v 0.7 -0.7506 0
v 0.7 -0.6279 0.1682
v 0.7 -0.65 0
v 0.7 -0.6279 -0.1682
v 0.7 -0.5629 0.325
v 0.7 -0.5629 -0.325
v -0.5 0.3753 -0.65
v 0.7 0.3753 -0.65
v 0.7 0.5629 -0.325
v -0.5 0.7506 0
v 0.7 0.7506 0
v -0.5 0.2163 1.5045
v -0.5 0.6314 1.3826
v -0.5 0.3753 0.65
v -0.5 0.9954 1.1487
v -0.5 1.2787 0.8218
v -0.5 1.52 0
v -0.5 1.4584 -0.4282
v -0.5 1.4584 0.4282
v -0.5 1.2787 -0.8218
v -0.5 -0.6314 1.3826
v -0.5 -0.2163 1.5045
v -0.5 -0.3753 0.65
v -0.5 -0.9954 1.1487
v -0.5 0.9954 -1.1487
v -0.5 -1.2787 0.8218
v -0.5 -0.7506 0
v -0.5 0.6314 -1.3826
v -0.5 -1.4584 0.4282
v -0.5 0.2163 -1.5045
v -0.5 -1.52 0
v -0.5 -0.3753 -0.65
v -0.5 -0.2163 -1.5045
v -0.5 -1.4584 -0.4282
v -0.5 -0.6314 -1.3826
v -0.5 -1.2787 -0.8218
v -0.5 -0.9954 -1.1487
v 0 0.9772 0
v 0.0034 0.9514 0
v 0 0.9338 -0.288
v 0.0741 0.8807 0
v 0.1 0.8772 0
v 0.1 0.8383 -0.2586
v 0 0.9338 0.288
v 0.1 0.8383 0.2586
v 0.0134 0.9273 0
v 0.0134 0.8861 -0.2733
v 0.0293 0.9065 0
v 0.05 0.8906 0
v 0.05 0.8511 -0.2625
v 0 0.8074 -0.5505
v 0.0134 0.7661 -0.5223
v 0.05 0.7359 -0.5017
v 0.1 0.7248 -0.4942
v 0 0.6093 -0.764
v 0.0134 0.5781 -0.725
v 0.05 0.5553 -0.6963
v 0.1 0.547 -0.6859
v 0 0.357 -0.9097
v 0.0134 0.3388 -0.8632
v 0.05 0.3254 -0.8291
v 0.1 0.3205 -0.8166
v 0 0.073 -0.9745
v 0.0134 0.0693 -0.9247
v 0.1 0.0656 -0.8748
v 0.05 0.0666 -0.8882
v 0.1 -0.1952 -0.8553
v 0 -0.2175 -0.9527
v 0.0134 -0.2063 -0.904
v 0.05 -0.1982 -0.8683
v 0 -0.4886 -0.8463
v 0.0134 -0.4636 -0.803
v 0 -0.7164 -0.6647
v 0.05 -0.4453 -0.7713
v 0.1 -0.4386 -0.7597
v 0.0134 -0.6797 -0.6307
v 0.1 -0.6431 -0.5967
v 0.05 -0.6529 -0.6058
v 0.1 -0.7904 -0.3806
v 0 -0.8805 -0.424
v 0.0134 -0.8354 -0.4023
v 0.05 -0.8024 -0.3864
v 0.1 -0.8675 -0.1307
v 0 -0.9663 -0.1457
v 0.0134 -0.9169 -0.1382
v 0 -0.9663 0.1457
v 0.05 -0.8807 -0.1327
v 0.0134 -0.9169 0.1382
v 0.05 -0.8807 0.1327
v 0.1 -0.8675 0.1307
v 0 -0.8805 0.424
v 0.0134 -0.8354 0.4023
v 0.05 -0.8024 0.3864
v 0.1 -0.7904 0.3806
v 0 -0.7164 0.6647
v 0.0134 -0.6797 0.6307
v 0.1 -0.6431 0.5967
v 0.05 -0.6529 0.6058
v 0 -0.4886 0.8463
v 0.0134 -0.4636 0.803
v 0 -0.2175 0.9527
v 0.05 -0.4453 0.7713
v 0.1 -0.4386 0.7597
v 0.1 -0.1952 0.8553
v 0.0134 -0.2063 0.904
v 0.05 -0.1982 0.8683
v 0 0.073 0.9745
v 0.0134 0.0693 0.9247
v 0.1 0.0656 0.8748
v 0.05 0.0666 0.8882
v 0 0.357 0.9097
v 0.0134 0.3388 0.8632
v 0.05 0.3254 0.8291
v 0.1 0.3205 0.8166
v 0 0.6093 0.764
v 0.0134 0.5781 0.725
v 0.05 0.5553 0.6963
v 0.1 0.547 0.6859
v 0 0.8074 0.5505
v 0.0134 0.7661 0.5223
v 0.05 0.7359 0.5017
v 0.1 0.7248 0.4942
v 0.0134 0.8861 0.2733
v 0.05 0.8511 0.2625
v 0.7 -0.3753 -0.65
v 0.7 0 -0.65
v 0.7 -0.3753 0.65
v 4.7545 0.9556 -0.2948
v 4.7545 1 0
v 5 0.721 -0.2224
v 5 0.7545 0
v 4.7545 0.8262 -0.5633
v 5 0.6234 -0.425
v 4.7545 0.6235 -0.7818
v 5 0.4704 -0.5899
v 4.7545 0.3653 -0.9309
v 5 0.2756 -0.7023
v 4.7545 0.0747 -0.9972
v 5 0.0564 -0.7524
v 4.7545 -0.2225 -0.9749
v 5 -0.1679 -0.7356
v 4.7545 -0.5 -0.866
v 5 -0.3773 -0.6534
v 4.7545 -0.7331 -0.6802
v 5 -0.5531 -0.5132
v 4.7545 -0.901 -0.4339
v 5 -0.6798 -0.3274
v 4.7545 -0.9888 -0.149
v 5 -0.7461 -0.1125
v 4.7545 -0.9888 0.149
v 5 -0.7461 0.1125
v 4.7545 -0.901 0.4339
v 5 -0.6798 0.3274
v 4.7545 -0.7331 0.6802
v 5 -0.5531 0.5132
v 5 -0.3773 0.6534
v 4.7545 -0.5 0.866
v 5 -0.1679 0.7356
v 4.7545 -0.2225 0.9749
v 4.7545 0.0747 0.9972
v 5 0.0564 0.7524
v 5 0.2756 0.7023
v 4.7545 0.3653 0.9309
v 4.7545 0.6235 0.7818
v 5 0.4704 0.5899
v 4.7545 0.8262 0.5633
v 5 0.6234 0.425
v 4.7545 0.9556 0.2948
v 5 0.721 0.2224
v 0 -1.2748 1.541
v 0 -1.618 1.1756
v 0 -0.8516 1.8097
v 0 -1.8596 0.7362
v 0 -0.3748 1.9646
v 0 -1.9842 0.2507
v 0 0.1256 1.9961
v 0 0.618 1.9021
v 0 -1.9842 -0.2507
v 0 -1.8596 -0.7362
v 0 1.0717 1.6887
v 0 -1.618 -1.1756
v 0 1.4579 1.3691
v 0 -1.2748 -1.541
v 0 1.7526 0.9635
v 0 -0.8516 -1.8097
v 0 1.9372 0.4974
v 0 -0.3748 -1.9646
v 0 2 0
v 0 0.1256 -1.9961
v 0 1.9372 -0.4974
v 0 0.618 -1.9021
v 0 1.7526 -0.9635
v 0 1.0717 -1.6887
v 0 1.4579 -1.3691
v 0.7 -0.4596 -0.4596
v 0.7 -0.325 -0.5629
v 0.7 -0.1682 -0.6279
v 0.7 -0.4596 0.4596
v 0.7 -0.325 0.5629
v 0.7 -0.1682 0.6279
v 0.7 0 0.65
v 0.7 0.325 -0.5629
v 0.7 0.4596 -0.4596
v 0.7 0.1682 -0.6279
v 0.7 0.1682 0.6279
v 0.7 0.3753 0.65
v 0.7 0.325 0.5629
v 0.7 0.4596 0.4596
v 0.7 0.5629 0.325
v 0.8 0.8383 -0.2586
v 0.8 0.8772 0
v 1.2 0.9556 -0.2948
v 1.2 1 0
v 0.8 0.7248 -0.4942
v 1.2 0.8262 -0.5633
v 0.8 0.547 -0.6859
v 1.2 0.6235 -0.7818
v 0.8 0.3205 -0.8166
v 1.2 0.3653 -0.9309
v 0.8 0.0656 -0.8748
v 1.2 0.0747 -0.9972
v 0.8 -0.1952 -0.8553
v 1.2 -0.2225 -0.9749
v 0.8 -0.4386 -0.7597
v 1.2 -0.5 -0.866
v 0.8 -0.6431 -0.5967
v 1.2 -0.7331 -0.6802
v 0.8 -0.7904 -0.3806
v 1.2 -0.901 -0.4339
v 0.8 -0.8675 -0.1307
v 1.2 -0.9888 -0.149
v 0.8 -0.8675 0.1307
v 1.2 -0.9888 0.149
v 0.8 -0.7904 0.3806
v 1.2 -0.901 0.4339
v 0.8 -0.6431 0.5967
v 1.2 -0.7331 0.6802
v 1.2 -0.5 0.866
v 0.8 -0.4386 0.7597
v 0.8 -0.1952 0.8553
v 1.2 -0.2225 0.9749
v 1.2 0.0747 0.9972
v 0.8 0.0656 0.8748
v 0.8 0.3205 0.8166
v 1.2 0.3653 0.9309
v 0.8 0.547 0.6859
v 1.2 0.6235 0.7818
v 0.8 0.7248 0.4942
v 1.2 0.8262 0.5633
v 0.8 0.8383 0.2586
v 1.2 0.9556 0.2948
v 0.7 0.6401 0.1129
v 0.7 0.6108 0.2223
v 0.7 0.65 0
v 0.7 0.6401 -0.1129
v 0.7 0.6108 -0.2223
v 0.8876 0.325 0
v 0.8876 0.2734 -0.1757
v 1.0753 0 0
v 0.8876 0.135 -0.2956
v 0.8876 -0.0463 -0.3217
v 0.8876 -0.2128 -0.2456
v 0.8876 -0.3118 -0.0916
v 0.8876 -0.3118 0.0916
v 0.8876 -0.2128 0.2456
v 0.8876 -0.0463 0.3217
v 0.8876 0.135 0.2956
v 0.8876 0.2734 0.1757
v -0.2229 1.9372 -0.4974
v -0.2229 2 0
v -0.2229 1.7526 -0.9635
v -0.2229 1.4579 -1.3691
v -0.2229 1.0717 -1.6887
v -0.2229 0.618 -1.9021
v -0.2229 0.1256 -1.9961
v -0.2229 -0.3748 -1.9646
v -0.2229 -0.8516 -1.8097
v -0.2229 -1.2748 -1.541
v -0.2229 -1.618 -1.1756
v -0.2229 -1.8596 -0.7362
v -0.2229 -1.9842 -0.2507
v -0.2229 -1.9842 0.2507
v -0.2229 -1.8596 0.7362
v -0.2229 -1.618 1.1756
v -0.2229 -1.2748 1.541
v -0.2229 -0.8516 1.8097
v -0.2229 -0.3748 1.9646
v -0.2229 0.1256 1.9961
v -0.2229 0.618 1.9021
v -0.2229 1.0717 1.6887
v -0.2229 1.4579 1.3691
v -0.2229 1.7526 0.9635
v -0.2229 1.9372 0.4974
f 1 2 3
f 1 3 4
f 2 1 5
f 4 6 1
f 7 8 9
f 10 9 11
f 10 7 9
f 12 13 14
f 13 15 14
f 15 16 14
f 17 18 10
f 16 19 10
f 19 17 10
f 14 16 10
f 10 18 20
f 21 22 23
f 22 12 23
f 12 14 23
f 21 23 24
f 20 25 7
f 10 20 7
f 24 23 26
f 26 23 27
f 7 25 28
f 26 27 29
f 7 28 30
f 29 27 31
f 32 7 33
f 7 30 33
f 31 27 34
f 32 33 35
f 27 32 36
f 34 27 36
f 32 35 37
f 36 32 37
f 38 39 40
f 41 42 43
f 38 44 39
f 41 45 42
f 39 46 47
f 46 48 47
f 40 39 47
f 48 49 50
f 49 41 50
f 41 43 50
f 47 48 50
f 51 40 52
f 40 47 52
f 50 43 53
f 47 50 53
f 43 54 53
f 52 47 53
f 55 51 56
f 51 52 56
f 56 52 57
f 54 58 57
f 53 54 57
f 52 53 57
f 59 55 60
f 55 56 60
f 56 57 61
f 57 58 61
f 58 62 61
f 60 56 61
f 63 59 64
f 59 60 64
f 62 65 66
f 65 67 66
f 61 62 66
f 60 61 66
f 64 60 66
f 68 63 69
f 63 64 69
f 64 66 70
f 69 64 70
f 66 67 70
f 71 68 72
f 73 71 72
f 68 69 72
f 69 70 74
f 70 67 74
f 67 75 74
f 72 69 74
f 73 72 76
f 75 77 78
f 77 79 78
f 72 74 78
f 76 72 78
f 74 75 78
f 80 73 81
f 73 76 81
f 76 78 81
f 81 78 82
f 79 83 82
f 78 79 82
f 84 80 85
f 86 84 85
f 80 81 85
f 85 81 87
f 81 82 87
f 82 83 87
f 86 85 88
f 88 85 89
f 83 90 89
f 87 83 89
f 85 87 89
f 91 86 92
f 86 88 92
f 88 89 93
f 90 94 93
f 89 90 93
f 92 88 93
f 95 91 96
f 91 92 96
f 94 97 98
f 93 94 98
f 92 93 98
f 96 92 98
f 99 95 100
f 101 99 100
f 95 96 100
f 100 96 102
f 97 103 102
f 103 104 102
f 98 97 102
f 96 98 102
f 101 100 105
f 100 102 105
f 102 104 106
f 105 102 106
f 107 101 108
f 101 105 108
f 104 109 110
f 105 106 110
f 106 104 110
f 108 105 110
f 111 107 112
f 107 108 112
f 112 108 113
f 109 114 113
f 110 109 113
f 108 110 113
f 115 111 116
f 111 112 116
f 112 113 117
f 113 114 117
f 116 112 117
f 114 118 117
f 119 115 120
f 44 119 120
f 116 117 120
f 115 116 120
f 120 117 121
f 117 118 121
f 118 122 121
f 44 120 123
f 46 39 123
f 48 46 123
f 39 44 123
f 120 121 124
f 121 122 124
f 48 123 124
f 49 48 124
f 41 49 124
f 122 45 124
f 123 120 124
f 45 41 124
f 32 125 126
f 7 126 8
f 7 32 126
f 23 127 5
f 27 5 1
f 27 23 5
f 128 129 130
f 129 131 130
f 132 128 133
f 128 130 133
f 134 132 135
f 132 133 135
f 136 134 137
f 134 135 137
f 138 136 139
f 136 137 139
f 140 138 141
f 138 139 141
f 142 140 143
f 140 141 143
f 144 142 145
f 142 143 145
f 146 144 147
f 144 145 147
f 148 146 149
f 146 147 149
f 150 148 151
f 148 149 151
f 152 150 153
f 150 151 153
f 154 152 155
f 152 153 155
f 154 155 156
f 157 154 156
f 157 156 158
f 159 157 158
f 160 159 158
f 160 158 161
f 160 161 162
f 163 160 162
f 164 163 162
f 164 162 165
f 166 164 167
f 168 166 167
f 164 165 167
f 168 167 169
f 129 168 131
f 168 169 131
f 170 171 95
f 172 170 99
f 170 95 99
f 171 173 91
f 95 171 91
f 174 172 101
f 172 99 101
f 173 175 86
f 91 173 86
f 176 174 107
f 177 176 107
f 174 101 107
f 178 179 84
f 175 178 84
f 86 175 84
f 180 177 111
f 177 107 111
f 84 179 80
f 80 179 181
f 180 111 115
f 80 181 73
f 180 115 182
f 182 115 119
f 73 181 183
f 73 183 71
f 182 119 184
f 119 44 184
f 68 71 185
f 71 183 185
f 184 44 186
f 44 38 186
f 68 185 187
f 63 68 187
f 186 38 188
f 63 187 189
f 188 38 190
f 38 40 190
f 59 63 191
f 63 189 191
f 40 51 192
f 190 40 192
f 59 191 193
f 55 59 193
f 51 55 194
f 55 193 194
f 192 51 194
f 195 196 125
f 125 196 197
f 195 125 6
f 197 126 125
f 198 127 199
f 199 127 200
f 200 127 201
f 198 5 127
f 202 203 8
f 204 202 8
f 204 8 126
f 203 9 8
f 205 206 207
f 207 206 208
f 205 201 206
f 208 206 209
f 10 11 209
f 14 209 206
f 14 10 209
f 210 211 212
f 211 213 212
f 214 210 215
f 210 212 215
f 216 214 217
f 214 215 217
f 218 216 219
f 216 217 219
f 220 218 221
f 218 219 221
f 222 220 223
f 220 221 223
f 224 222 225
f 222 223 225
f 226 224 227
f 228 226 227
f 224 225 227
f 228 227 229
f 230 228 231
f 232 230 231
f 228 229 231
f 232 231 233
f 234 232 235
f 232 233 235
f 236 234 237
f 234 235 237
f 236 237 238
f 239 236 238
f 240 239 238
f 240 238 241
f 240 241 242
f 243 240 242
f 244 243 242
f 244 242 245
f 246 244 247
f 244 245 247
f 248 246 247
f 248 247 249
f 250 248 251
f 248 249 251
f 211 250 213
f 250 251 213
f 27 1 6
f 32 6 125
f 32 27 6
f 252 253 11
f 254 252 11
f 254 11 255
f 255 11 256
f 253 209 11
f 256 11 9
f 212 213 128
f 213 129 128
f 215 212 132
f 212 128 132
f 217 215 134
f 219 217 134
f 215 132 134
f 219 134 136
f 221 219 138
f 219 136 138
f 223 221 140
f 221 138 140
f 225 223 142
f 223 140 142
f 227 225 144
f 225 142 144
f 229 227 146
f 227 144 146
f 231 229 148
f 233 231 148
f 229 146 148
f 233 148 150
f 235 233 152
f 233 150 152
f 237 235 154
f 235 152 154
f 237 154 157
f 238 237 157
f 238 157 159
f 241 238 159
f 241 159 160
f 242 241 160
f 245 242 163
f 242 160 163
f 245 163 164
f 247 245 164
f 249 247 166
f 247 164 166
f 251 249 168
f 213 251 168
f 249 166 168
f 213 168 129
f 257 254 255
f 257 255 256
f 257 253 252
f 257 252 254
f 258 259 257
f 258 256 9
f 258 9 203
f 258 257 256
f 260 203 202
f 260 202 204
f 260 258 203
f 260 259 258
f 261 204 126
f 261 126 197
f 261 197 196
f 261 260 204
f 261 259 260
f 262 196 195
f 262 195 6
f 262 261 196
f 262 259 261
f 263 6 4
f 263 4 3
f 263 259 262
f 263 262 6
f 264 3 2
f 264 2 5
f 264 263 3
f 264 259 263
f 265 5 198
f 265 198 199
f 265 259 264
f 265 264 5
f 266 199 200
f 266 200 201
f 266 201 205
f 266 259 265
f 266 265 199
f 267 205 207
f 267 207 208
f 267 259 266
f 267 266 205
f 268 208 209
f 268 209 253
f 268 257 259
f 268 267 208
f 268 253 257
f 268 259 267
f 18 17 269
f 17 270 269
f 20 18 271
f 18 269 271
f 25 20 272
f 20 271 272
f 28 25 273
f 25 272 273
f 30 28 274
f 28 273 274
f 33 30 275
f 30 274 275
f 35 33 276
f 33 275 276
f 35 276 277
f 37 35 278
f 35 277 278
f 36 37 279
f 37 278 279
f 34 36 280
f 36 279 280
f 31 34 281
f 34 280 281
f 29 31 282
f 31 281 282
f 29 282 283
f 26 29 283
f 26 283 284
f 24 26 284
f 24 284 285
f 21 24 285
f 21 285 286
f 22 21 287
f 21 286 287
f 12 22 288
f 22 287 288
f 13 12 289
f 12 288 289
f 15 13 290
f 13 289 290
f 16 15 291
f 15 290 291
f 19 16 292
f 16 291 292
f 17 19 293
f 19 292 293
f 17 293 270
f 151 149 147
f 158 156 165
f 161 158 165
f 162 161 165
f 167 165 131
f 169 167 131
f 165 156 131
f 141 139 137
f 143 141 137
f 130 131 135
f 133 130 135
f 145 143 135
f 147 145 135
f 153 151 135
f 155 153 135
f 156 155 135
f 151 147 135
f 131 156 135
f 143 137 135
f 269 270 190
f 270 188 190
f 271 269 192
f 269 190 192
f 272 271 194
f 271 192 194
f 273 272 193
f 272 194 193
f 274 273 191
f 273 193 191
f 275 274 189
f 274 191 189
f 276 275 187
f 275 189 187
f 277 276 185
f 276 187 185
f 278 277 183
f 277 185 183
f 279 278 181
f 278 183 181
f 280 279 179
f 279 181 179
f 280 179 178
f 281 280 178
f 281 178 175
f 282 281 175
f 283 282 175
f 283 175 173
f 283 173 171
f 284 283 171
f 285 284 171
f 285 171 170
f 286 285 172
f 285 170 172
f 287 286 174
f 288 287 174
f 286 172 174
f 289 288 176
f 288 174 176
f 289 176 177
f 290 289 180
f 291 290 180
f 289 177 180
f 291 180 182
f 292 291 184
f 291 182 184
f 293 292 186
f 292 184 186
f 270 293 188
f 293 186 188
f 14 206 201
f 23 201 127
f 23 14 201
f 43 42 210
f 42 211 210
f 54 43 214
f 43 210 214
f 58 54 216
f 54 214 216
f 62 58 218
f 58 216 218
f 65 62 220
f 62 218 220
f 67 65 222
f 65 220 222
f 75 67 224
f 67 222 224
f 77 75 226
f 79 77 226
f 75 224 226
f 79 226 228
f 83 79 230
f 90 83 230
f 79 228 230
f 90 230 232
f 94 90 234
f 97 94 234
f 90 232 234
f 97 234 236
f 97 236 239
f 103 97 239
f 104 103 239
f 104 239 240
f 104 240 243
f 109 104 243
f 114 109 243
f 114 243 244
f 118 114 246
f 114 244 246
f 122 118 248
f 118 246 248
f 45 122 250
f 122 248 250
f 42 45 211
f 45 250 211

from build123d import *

# Parameters (mm, degrees)
CUT_EXTRUDE1_DEPTH = 1.2


with BuildPart() as part:
    # Sketch1 → Revolve1 (revolve)
    with BuildSketch(Plane.XY):
        with BuildLine():
            Line((-0.5, 0), (-0.5, 1.52))
            Line((-0.5, 1.52), (-0.222871871, 2))
            Line((-0.222871871, 2), (0, 2))
            Line((0, 2), (0, 0.97725))
            ThreePointArc((0, 0.97725), (0.029289322, 0.906539322), (0.1, 0.87725))
            Line((0.1, 0.87725), (0.8, 0.87725))
            Line((0.8, 0.87725), (1.2, 1))
            Line((1.2, 1), (4.7545, 1))
            Line((4.7545, 1), (5, 0.7545))
            Line((5, 0.7545), (5, 0))
            Line((5, 0), (-0.5, 0))
        make_face()
    revolve(axis=Axis((5, 0, 0), (-1, 0, 0)))

    # Sketch2 → Cut-Revolve1 (revolve, cut)
    with BuildSketch(Plane.XY):
        Polygon((-0.5, 0), (-0.5, 0.65), (0.7, 0.65), (1.075277675, 0), align=None)
    revolve(axis=Axis((1.075277675, 0, 0), (-1, 0, 0)), mode=Mode.SUBTRACT)

    # Sketch3 → Cut-Extrude1 (cut)
    with BuildSketch(Plane(origin=(-0.5, 0, 0), x_dir=(0, 0, -1), z_dir=(1, 0, 0))):
        Polygon((-0.65, -0.375277675), (0, -0.75055535), (0.65, -0.375277675), (0.65, 0.375277675), (0, 0.75055535), (-0.65, 0.375277675), align=None)
    extrude(amount=CUT_EXTRUDE1_DEPTH, mode=Mode.SUBTRACT)


solid = part.part
